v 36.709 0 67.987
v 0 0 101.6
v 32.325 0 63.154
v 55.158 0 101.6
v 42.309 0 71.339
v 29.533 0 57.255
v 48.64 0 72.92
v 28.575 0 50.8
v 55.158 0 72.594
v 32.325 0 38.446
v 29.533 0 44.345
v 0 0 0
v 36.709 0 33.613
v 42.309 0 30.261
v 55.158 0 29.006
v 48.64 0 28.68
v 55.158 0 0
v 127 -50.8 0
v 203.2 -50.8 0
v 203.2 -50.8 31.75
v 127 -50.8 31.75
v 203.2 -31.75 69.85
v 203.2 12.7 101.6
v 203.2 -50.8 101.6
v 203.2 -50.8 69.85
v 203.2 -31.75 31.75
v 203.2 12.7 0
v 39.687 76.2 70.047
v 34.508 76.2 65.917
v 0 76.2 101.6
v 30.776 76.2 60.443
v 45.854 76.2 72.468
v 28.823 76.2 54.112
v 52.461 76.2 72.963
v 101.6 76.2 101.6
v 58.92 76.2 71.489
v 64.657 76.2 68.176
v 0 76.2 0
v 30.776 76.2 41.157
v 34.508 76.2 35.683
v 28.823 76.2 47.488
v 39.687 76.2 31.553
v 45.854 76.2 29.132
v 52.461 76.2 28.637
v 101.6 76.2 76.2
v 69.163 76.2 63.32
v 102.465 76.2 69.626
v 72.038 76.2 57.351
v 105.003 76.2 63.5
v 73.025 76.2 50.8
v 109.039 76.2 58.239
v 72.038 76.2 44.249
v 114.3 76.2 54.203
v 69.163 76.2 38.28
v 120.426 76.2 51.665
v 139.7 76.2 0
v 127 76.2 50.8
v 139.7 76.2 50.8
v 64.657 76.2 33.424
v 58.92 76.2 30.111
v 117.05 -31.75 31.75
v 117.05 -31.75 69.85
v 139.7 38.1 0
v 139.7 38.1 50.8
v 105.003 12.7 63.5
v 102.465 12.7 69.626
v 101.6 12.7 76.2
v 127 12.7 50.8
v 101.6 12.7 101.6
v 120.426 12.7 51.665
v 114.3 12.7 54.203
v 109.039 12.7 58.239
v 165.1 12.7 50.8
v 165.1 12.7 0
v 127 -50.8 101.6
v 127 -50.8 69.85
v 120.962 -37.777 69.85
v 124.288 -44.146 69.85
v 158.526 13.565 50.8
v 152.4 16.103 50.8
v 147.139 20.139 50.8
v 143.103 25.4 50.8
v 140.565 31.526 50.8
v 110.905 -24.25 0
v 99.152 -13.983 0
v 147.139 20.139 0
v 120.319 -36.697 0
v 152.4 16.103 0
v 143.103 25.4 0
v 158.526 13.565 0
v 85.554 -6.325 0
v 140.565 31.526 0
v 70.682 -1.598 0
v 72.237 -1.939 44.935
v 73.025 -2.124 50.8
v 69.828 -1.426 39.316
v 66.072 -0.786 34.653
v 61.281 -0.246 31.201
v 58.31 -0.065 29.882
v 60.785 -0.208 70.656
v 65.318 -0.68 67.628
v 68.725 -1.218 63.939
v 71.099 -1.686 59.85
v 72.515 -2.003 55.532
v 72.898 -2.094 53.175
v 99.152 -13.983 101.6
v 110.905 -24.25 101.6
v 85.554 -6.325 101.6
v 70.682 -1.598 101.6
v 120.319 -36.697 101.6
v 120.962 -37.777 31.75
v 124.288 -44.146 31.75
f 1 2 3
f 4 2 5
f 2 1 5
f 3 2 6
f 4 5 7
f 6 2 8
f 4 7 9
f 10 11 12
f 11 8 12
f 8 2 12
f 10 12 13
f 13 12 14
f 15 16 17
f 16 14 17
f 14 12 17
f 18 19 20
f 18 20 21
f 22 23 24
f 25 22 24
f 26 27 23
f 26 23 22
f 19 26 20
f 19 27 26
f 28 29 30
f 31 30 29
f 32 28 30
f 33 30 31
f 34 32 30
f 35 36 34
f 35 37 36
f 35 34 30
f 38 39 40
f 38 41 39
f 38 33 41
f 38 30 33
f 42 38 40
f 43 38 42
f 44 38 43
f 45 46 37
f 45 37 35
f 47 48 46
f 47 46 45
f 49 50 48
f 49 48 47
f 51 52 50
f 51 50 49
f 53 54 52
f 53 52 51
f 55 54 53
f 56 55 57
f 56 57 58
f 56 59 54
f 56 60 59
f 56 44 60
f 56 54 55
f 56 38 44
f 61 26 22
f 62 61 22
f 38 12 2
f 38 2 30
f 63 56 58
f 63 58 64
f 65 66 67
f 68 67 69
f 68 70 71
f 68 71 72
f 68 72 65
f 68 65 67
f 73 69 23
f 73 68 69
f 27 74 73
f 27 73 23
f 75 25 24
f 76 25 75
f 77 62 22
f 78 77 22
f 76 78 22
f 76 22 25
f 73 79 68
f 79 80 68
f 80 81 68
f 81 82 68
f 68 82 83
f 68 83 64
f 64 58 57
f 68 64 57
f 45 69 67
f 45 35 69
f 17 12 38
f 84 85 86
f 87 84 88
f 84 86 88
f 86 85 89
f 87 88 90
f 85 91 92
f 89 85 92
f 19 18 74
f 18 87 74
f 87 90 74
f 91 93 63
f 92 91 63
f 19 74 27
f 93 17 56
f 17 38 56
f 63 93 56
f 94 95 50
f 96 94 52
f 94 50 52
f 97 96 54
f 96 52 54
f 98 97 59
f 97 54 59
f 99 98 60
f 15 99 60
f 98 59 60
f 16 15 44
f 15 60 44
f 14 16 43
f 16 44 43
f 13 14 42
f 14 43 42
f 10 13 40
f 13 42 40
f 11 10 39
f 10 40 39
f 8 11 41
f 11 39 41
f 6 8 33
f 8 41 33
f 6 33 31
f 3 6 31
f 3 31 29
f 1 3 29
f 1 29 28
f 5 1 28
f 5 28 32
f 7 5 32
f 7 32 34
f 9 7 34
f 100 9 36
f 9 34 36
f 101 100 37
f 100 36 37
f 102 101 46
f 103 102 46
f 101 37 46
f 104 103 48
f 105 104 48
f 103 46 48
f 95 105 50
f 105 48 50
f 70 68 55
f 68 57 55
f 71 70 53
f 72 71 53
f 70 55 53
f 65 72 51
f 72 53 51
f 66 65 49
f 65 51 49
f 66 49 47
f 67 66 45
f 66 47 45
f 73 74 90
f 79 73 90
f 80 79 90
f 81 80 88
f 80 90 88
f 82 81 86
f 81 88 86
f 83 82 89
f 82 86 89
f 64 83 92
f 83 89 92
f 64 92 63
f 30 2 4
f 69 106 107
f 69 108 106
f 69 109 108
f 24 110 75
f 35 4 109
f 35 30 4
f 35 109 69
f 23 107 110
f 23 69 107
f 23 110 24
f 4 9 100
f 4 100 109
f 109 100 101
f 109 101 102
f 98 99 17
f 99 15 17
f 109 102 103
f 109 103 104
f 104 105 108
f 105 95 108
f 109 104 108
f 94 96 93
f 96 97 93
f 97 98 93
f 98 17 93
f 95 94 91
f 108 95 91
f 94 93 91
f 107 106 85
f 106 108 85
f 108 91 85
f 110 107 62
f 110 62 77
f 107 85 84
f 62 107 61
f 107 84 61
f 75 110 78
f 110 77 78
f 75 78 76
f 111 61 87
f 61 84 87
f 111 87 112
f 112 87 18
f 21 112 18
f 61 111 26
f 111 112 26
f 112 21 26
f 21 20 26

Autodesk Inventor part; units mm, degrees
ref_plane "YZ Plane" through (0, 0, 0) normal (1, 0, 0) x (0, 1, 0)
ref_plane "XZ Plane" through (0, 0, 0) normal (0, 1, 0) x (-1, 0, 0)
ref_plane "XY Plane" through (0, 0, 0) normal (0, 0, 1) x (1, 0, 0)
sketch "Sketch1" plane through (0, 0, 0) normal (0, 0, 1) x (1, 0, 0)
  line L0 (0, 0) -> (0, 76.2)
  line L1 (0, 76.2) -> (139.7, 76.2)
  line L2 (139.7, 76.2) -> (139.7, 38.1)
  line L3 (165.1, 12.7) -> (203.2, 12.7)
  line L4 (203.2, 12.7) -> (203.2, -50.8)
  line L5 (203.2, -50.8) -> (127, -50.8)
  line L6 (0, 0) -> (55.158, 0)
  arc A0 (139.7, 38.1) -> (165.1, 12.7) centre (165.1, 38.1) ccw
  arc A1 (127, -50.8) -> (55.158, 0) centre (55.158, -76.2) ccw
  dimension "d0" = 76.2
  dimension "d2" = 203.2
  dimension "d3" = 139.7
  dimension "d4" = 76.2
  dimension "d5" = 127
  dimension "d6" = 63.5
  dimension "d7" = 25.4
  dimension "d8" = 76.2
extrude "Extrusion1" add sketch "Sketch1" along normal blind 101.6
sketch "Sketch2" plane through (0, 76.2, 0) normal (0, 1, 0) x (1, 0, 0)
  line L0 (139.7, 0) -> (139.7, -50.8)
  line L1 (139.7, 0) -> (139.7, -101.6) projected
  line L2 (0, -101.6) -> (101.6, -101.6)
  line L3 (127, -101.6) -> (55.158, -101.6) projected
  line L4 (101.6, -101.6) -> (101.6, -76.2)
  line L5 (127, -50.8) -> (139.7, -50.8)
  arc A0 (127, -50.8) -> (101.6, -76.2) centre (127, -76.2) ccw
  line L6 (101.6, -101.6) -> (139.7, -101.6)
  line L7 (139.7, -101.6) -> (165.1, -101.6)
  line L8 (165.1, -101.6) -> (165.1, -50.8)
  line L9 (165.1, 0) -> (165.1, -101.6) projected
  line L10 (165.1, -50.8) -> (139.7, -50.8)
  point P0 (0, 0)
  dimension "d11" = 50.8
  dimension "d12" = 101.6
  dimension "d13" = 25.4
extrude "Extrusion3" cut sketch "Sketch2" against normal blind 63.5
sketch "Sketch3" plane through (0, 76.2, 0) normal (0, 1, 0) x (1, 0, 0)
  circle A0 centre (50.8, -50.8) radius 22.225
  line L0 (55.158, 0) -> (0, 0) projected
  line L1 (0, 0) -> (0, -101.6) projected
  dimension "d18" = 44.45
  dimension "d19" = 50.8
  dimension "d20" = 50.8
extrude "Extrusion4" cut sketch "Sketch3" against normal through all
sketch "Sketch4" plane through (203.2, -50.8, 0) normal (1, 0, 0) x (0, 0, -1)
  line L0 (0, 0) -> (-31.75, 0)
  line L1 (0, 0) -> (-101.6, 0) projected
  line L2 (-31.75, 0) -> (-31.75, 19.05)
  line L3 (-31.75, 19.05) -> (-69.85, 19.05)
  line L4 (-69.85, 19.05) -> (-69.85, 0)
  line L5 (-31.75, 0) -> (-69.85, 0)
  point P0 (0, 50.8)
  dimension "d23" = 31.75
  dimension "d24" = 19.05
  dimension "d25" = 38.1
extrude "Extrusion5" cut sketch "Sketch4" against normal through all
properties part number "HW 8 Part 1"
